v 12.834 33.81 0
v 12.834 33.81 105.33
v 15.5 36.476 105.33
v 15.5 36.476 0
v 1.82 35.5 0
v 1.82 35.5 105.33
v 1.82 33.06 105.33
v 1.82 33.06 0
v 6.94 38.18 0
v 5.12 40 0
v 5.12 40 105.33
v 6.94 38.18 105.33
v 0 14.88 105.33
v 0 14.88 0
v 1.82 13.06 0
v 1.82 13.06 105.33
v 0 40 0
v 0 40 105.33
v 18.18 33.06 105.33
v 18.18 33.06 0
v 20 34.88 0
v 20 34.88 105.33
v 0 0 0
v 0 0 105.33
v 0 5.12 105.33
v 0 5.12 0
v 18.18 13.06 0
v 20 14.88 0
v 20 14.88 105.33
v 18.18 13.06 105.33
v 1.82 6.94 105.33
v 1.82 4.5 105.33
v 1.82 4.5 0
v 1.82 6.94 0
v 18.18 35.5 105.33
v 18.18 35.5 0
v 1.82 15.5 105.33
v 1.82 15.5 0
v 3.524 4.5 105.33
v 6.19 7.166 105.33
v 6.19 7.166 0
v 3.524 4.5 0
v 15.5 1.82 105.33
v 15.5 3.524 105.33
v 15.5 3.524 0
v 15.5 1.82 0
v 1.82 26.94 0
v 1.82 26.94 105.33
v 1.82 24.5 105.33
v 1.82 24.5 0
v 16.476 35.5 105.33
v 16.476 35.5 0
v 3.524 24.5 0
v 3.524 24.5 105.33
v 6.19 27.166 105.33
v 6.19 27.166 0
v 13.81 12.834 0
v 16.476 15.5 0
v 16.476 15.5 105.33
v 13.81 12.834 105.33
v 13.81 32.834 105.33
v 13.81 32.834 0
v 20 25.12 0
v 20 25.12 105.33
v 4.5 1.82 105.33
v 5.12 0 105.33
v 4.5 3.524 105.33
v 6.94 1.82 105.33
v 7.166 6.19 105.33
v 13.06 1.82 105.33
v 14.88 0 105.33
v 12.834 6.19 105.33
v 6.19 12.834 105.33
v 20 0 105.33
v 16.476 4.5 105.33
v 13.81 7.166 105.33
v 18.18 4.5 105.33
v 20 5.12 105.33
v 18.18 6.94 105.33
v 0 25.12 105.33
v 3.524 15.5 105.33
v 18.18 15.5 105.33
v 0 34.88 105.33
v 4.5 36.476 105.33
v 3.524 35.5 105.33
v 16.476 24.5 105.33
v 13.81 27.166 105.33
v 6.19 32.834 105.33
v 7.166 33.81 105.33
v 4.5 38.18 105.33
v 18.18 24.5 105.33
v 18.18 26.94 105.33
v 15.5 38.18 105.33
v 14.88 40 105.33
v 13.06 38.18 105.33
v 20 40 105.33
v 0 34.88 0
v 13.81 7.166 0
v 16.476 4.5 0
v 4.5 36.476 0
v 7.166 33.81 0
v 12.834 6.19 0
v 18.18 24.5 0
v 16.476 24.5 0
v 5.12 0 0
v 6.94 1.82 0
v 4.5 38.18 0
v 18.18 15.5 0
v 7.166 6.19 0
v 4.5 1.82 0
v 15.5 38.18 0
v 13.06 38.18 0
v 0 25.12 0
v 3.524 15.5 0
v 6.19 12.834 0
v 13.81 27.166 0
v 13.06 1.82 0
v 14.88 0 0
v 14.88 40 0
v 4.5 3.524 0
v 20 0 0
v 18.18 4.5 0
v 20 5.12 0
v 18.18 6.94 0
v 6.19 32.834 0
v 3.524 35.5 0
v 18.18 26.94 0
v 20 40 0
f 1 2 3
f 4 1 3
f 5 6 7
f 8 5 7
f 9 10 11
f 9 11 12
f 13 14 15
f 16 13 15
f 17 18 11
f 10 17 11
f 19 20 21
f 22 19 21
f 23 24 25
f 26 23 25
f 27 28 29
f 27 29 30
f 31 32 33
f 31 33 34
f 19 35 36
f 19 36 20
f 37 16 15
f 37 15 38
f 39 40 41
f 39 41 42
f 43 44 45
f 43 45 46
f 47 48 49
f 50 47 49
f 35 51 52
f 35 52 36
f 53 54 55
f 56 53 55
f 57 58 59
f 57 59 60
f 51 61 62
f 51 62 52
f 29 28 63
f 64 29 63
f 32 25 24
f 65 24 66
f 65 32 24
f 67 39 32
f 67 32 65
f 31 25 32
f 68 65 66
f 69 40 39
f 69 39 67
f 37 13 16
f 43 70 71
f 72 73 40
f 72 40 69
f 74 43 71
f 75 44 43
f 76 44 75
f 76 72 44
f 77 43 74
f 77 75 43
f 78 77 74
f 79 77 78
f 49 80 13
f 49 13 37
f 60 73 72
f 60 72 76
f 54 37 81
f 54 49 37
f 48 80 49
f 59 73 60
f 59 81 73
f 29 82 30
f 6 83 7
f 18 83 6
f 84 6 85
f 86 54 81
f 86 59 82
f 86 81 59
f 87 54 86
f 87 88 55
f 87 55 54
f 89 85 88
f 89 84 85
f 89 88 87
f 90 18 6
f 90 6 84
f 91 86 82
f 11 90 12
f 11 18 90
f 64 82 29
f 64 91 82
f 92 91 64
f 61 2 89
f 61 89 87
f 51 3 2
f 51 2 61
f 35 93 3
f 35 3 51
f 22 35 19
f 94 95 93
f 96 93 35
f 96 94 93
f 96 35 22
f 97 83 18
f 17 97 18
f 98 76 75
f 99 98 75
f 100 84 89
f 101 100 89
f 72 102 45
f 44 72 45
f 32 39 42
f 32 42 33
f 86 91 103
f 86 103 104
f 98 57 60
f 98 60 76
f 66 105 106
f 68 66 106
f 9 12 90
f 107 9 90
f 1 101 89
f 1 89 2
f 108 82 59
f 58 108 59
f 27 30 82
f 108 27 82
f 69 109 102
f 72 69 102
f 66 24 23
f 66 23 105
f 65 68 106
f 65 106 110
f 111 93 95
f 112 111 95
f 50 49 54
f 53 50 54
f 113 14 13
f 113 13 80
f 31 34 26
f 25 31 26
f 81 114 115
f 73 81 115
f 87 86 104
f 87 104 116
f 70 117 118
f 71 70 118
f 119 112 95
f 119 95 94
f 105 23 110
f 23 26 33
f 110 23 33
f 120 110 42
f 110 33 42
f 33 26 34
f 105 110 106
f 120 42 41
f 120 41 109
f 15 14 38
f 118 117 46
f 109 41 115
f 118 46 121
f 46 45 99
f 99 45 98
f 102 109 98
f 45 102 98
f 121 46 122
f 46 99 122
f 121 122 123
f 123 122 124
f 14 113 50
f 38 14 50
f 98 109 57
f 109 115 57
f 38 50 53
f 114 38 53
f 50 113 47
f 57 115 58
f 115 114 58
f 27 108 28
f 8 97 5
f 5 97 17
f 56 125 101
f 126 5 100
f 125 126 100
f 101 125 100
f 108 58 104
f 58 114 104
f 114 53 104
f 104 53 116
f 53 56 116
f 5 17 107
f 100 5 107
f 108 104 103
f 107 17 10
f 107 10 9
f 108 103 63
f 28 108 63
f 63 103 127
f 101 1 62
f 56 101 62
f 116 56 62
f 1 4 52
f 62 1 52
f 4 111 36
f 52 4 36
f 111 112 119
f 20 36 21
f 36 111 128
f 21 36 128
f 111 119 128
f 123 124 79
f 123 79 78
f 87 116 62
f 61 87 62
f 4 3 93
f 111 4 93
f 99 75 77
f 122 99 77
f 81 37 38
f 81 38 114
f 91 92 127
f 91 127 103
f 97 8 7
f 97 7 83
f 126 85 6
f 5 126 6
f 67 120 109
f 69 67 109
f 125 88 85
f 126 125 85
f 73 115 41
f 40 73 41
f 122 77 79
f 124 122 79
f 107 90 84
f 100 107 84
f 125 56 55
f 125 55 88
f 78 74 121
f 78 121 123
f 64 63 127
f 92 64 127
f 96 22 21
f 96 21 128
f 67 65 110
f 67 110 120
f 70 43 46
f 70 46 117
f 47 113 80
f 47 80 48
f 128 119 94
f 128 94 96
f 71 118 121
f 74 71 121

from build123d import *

# Parameters (mm, degrees)
SKETCH1_W           = 20
SKETCH1_H           = 40
BOSS_EXTRUDE1_DEPTH = 105.33
CUT_EXTRUDE1_DEPTH  = 106.33


with BuildPart() as part:
    # Sketch1 → Boss-Extrude1 (new body)
    with BuildSketch(Plane.XY):
        with Locations((10, 20)):
            Rectangle(SKETCH1_W, SKETCH1_H)
    extrude(amount=BOSS_EXTRUDE1_DEPTH)

    # Sketch2 → Cut-Extrude1 (cut, through all)
    with BuildSketch(Plane.XY.offset(105.33)):
        Polygon((5.12, 40), (6.94, 38.18), (4.5, 38.18), (4.5, 36.475807358), (7.165807358, 33.81), (12.834192642, 33.81), (15.5, 36.475807358), (15.5, 38.18), (13.06, 38.18), (14.88, 40), align=None)
        Polygon((18.18, 35.5), (18.18, 33.06), (20, 34.88), (20, 25.12), (18.18, 26.94), (18.18, 24.5), (16.475807358, 24.5), (13.81, 27.165807358), (13.81, 32.834192642), (16.475807358, 35.5), align=None)
        Polygon((20, 14.88), (18.18, 13.06), (18.18, 15.5), (16.475807358, 15.5), (13.81, 12.834192642), (13.81, 7.165807358), (16.475807358, 4.5), (18.18, 4.5), (18.18, 6.94), (20, 5.12), align=None)
        Polygon((15.5, 1.82), (13.06, 1.82), (14.88, 0), (5.12, 0), (6.94, 1.82), (4.5, 1.82), (4.5, 3.524192642), (7.165807358, 6.19), (12.834192642, 6.19), (15.5, 3.524192642), align=None)
        Polygon((1.82, 4.5), (1.82, 6.94), (0, 5.12), (0, 14.88), (1.82, 13.06), (1.82, 15.5), (3.524192642, 15.5), (6.19, 12.834192642), (6.19, 7.165807358), (3.524192642, 4.5), align=None)
        Polygon((0, 25.12), (1.82, 26.94), (1.82, 24.5), (3.524192642, 24.5), (6.19, 27.165807358), (6.19, 32.834192642), (3.524192642, 35.5), (1.82, 35.5), (1.82, 33.06), (0, 34.88), align=None)
    extrude(amount=-CUT_EXTRUDE1_DEPTH, mode=Mode.SUBTRACT)


solid = part.part
